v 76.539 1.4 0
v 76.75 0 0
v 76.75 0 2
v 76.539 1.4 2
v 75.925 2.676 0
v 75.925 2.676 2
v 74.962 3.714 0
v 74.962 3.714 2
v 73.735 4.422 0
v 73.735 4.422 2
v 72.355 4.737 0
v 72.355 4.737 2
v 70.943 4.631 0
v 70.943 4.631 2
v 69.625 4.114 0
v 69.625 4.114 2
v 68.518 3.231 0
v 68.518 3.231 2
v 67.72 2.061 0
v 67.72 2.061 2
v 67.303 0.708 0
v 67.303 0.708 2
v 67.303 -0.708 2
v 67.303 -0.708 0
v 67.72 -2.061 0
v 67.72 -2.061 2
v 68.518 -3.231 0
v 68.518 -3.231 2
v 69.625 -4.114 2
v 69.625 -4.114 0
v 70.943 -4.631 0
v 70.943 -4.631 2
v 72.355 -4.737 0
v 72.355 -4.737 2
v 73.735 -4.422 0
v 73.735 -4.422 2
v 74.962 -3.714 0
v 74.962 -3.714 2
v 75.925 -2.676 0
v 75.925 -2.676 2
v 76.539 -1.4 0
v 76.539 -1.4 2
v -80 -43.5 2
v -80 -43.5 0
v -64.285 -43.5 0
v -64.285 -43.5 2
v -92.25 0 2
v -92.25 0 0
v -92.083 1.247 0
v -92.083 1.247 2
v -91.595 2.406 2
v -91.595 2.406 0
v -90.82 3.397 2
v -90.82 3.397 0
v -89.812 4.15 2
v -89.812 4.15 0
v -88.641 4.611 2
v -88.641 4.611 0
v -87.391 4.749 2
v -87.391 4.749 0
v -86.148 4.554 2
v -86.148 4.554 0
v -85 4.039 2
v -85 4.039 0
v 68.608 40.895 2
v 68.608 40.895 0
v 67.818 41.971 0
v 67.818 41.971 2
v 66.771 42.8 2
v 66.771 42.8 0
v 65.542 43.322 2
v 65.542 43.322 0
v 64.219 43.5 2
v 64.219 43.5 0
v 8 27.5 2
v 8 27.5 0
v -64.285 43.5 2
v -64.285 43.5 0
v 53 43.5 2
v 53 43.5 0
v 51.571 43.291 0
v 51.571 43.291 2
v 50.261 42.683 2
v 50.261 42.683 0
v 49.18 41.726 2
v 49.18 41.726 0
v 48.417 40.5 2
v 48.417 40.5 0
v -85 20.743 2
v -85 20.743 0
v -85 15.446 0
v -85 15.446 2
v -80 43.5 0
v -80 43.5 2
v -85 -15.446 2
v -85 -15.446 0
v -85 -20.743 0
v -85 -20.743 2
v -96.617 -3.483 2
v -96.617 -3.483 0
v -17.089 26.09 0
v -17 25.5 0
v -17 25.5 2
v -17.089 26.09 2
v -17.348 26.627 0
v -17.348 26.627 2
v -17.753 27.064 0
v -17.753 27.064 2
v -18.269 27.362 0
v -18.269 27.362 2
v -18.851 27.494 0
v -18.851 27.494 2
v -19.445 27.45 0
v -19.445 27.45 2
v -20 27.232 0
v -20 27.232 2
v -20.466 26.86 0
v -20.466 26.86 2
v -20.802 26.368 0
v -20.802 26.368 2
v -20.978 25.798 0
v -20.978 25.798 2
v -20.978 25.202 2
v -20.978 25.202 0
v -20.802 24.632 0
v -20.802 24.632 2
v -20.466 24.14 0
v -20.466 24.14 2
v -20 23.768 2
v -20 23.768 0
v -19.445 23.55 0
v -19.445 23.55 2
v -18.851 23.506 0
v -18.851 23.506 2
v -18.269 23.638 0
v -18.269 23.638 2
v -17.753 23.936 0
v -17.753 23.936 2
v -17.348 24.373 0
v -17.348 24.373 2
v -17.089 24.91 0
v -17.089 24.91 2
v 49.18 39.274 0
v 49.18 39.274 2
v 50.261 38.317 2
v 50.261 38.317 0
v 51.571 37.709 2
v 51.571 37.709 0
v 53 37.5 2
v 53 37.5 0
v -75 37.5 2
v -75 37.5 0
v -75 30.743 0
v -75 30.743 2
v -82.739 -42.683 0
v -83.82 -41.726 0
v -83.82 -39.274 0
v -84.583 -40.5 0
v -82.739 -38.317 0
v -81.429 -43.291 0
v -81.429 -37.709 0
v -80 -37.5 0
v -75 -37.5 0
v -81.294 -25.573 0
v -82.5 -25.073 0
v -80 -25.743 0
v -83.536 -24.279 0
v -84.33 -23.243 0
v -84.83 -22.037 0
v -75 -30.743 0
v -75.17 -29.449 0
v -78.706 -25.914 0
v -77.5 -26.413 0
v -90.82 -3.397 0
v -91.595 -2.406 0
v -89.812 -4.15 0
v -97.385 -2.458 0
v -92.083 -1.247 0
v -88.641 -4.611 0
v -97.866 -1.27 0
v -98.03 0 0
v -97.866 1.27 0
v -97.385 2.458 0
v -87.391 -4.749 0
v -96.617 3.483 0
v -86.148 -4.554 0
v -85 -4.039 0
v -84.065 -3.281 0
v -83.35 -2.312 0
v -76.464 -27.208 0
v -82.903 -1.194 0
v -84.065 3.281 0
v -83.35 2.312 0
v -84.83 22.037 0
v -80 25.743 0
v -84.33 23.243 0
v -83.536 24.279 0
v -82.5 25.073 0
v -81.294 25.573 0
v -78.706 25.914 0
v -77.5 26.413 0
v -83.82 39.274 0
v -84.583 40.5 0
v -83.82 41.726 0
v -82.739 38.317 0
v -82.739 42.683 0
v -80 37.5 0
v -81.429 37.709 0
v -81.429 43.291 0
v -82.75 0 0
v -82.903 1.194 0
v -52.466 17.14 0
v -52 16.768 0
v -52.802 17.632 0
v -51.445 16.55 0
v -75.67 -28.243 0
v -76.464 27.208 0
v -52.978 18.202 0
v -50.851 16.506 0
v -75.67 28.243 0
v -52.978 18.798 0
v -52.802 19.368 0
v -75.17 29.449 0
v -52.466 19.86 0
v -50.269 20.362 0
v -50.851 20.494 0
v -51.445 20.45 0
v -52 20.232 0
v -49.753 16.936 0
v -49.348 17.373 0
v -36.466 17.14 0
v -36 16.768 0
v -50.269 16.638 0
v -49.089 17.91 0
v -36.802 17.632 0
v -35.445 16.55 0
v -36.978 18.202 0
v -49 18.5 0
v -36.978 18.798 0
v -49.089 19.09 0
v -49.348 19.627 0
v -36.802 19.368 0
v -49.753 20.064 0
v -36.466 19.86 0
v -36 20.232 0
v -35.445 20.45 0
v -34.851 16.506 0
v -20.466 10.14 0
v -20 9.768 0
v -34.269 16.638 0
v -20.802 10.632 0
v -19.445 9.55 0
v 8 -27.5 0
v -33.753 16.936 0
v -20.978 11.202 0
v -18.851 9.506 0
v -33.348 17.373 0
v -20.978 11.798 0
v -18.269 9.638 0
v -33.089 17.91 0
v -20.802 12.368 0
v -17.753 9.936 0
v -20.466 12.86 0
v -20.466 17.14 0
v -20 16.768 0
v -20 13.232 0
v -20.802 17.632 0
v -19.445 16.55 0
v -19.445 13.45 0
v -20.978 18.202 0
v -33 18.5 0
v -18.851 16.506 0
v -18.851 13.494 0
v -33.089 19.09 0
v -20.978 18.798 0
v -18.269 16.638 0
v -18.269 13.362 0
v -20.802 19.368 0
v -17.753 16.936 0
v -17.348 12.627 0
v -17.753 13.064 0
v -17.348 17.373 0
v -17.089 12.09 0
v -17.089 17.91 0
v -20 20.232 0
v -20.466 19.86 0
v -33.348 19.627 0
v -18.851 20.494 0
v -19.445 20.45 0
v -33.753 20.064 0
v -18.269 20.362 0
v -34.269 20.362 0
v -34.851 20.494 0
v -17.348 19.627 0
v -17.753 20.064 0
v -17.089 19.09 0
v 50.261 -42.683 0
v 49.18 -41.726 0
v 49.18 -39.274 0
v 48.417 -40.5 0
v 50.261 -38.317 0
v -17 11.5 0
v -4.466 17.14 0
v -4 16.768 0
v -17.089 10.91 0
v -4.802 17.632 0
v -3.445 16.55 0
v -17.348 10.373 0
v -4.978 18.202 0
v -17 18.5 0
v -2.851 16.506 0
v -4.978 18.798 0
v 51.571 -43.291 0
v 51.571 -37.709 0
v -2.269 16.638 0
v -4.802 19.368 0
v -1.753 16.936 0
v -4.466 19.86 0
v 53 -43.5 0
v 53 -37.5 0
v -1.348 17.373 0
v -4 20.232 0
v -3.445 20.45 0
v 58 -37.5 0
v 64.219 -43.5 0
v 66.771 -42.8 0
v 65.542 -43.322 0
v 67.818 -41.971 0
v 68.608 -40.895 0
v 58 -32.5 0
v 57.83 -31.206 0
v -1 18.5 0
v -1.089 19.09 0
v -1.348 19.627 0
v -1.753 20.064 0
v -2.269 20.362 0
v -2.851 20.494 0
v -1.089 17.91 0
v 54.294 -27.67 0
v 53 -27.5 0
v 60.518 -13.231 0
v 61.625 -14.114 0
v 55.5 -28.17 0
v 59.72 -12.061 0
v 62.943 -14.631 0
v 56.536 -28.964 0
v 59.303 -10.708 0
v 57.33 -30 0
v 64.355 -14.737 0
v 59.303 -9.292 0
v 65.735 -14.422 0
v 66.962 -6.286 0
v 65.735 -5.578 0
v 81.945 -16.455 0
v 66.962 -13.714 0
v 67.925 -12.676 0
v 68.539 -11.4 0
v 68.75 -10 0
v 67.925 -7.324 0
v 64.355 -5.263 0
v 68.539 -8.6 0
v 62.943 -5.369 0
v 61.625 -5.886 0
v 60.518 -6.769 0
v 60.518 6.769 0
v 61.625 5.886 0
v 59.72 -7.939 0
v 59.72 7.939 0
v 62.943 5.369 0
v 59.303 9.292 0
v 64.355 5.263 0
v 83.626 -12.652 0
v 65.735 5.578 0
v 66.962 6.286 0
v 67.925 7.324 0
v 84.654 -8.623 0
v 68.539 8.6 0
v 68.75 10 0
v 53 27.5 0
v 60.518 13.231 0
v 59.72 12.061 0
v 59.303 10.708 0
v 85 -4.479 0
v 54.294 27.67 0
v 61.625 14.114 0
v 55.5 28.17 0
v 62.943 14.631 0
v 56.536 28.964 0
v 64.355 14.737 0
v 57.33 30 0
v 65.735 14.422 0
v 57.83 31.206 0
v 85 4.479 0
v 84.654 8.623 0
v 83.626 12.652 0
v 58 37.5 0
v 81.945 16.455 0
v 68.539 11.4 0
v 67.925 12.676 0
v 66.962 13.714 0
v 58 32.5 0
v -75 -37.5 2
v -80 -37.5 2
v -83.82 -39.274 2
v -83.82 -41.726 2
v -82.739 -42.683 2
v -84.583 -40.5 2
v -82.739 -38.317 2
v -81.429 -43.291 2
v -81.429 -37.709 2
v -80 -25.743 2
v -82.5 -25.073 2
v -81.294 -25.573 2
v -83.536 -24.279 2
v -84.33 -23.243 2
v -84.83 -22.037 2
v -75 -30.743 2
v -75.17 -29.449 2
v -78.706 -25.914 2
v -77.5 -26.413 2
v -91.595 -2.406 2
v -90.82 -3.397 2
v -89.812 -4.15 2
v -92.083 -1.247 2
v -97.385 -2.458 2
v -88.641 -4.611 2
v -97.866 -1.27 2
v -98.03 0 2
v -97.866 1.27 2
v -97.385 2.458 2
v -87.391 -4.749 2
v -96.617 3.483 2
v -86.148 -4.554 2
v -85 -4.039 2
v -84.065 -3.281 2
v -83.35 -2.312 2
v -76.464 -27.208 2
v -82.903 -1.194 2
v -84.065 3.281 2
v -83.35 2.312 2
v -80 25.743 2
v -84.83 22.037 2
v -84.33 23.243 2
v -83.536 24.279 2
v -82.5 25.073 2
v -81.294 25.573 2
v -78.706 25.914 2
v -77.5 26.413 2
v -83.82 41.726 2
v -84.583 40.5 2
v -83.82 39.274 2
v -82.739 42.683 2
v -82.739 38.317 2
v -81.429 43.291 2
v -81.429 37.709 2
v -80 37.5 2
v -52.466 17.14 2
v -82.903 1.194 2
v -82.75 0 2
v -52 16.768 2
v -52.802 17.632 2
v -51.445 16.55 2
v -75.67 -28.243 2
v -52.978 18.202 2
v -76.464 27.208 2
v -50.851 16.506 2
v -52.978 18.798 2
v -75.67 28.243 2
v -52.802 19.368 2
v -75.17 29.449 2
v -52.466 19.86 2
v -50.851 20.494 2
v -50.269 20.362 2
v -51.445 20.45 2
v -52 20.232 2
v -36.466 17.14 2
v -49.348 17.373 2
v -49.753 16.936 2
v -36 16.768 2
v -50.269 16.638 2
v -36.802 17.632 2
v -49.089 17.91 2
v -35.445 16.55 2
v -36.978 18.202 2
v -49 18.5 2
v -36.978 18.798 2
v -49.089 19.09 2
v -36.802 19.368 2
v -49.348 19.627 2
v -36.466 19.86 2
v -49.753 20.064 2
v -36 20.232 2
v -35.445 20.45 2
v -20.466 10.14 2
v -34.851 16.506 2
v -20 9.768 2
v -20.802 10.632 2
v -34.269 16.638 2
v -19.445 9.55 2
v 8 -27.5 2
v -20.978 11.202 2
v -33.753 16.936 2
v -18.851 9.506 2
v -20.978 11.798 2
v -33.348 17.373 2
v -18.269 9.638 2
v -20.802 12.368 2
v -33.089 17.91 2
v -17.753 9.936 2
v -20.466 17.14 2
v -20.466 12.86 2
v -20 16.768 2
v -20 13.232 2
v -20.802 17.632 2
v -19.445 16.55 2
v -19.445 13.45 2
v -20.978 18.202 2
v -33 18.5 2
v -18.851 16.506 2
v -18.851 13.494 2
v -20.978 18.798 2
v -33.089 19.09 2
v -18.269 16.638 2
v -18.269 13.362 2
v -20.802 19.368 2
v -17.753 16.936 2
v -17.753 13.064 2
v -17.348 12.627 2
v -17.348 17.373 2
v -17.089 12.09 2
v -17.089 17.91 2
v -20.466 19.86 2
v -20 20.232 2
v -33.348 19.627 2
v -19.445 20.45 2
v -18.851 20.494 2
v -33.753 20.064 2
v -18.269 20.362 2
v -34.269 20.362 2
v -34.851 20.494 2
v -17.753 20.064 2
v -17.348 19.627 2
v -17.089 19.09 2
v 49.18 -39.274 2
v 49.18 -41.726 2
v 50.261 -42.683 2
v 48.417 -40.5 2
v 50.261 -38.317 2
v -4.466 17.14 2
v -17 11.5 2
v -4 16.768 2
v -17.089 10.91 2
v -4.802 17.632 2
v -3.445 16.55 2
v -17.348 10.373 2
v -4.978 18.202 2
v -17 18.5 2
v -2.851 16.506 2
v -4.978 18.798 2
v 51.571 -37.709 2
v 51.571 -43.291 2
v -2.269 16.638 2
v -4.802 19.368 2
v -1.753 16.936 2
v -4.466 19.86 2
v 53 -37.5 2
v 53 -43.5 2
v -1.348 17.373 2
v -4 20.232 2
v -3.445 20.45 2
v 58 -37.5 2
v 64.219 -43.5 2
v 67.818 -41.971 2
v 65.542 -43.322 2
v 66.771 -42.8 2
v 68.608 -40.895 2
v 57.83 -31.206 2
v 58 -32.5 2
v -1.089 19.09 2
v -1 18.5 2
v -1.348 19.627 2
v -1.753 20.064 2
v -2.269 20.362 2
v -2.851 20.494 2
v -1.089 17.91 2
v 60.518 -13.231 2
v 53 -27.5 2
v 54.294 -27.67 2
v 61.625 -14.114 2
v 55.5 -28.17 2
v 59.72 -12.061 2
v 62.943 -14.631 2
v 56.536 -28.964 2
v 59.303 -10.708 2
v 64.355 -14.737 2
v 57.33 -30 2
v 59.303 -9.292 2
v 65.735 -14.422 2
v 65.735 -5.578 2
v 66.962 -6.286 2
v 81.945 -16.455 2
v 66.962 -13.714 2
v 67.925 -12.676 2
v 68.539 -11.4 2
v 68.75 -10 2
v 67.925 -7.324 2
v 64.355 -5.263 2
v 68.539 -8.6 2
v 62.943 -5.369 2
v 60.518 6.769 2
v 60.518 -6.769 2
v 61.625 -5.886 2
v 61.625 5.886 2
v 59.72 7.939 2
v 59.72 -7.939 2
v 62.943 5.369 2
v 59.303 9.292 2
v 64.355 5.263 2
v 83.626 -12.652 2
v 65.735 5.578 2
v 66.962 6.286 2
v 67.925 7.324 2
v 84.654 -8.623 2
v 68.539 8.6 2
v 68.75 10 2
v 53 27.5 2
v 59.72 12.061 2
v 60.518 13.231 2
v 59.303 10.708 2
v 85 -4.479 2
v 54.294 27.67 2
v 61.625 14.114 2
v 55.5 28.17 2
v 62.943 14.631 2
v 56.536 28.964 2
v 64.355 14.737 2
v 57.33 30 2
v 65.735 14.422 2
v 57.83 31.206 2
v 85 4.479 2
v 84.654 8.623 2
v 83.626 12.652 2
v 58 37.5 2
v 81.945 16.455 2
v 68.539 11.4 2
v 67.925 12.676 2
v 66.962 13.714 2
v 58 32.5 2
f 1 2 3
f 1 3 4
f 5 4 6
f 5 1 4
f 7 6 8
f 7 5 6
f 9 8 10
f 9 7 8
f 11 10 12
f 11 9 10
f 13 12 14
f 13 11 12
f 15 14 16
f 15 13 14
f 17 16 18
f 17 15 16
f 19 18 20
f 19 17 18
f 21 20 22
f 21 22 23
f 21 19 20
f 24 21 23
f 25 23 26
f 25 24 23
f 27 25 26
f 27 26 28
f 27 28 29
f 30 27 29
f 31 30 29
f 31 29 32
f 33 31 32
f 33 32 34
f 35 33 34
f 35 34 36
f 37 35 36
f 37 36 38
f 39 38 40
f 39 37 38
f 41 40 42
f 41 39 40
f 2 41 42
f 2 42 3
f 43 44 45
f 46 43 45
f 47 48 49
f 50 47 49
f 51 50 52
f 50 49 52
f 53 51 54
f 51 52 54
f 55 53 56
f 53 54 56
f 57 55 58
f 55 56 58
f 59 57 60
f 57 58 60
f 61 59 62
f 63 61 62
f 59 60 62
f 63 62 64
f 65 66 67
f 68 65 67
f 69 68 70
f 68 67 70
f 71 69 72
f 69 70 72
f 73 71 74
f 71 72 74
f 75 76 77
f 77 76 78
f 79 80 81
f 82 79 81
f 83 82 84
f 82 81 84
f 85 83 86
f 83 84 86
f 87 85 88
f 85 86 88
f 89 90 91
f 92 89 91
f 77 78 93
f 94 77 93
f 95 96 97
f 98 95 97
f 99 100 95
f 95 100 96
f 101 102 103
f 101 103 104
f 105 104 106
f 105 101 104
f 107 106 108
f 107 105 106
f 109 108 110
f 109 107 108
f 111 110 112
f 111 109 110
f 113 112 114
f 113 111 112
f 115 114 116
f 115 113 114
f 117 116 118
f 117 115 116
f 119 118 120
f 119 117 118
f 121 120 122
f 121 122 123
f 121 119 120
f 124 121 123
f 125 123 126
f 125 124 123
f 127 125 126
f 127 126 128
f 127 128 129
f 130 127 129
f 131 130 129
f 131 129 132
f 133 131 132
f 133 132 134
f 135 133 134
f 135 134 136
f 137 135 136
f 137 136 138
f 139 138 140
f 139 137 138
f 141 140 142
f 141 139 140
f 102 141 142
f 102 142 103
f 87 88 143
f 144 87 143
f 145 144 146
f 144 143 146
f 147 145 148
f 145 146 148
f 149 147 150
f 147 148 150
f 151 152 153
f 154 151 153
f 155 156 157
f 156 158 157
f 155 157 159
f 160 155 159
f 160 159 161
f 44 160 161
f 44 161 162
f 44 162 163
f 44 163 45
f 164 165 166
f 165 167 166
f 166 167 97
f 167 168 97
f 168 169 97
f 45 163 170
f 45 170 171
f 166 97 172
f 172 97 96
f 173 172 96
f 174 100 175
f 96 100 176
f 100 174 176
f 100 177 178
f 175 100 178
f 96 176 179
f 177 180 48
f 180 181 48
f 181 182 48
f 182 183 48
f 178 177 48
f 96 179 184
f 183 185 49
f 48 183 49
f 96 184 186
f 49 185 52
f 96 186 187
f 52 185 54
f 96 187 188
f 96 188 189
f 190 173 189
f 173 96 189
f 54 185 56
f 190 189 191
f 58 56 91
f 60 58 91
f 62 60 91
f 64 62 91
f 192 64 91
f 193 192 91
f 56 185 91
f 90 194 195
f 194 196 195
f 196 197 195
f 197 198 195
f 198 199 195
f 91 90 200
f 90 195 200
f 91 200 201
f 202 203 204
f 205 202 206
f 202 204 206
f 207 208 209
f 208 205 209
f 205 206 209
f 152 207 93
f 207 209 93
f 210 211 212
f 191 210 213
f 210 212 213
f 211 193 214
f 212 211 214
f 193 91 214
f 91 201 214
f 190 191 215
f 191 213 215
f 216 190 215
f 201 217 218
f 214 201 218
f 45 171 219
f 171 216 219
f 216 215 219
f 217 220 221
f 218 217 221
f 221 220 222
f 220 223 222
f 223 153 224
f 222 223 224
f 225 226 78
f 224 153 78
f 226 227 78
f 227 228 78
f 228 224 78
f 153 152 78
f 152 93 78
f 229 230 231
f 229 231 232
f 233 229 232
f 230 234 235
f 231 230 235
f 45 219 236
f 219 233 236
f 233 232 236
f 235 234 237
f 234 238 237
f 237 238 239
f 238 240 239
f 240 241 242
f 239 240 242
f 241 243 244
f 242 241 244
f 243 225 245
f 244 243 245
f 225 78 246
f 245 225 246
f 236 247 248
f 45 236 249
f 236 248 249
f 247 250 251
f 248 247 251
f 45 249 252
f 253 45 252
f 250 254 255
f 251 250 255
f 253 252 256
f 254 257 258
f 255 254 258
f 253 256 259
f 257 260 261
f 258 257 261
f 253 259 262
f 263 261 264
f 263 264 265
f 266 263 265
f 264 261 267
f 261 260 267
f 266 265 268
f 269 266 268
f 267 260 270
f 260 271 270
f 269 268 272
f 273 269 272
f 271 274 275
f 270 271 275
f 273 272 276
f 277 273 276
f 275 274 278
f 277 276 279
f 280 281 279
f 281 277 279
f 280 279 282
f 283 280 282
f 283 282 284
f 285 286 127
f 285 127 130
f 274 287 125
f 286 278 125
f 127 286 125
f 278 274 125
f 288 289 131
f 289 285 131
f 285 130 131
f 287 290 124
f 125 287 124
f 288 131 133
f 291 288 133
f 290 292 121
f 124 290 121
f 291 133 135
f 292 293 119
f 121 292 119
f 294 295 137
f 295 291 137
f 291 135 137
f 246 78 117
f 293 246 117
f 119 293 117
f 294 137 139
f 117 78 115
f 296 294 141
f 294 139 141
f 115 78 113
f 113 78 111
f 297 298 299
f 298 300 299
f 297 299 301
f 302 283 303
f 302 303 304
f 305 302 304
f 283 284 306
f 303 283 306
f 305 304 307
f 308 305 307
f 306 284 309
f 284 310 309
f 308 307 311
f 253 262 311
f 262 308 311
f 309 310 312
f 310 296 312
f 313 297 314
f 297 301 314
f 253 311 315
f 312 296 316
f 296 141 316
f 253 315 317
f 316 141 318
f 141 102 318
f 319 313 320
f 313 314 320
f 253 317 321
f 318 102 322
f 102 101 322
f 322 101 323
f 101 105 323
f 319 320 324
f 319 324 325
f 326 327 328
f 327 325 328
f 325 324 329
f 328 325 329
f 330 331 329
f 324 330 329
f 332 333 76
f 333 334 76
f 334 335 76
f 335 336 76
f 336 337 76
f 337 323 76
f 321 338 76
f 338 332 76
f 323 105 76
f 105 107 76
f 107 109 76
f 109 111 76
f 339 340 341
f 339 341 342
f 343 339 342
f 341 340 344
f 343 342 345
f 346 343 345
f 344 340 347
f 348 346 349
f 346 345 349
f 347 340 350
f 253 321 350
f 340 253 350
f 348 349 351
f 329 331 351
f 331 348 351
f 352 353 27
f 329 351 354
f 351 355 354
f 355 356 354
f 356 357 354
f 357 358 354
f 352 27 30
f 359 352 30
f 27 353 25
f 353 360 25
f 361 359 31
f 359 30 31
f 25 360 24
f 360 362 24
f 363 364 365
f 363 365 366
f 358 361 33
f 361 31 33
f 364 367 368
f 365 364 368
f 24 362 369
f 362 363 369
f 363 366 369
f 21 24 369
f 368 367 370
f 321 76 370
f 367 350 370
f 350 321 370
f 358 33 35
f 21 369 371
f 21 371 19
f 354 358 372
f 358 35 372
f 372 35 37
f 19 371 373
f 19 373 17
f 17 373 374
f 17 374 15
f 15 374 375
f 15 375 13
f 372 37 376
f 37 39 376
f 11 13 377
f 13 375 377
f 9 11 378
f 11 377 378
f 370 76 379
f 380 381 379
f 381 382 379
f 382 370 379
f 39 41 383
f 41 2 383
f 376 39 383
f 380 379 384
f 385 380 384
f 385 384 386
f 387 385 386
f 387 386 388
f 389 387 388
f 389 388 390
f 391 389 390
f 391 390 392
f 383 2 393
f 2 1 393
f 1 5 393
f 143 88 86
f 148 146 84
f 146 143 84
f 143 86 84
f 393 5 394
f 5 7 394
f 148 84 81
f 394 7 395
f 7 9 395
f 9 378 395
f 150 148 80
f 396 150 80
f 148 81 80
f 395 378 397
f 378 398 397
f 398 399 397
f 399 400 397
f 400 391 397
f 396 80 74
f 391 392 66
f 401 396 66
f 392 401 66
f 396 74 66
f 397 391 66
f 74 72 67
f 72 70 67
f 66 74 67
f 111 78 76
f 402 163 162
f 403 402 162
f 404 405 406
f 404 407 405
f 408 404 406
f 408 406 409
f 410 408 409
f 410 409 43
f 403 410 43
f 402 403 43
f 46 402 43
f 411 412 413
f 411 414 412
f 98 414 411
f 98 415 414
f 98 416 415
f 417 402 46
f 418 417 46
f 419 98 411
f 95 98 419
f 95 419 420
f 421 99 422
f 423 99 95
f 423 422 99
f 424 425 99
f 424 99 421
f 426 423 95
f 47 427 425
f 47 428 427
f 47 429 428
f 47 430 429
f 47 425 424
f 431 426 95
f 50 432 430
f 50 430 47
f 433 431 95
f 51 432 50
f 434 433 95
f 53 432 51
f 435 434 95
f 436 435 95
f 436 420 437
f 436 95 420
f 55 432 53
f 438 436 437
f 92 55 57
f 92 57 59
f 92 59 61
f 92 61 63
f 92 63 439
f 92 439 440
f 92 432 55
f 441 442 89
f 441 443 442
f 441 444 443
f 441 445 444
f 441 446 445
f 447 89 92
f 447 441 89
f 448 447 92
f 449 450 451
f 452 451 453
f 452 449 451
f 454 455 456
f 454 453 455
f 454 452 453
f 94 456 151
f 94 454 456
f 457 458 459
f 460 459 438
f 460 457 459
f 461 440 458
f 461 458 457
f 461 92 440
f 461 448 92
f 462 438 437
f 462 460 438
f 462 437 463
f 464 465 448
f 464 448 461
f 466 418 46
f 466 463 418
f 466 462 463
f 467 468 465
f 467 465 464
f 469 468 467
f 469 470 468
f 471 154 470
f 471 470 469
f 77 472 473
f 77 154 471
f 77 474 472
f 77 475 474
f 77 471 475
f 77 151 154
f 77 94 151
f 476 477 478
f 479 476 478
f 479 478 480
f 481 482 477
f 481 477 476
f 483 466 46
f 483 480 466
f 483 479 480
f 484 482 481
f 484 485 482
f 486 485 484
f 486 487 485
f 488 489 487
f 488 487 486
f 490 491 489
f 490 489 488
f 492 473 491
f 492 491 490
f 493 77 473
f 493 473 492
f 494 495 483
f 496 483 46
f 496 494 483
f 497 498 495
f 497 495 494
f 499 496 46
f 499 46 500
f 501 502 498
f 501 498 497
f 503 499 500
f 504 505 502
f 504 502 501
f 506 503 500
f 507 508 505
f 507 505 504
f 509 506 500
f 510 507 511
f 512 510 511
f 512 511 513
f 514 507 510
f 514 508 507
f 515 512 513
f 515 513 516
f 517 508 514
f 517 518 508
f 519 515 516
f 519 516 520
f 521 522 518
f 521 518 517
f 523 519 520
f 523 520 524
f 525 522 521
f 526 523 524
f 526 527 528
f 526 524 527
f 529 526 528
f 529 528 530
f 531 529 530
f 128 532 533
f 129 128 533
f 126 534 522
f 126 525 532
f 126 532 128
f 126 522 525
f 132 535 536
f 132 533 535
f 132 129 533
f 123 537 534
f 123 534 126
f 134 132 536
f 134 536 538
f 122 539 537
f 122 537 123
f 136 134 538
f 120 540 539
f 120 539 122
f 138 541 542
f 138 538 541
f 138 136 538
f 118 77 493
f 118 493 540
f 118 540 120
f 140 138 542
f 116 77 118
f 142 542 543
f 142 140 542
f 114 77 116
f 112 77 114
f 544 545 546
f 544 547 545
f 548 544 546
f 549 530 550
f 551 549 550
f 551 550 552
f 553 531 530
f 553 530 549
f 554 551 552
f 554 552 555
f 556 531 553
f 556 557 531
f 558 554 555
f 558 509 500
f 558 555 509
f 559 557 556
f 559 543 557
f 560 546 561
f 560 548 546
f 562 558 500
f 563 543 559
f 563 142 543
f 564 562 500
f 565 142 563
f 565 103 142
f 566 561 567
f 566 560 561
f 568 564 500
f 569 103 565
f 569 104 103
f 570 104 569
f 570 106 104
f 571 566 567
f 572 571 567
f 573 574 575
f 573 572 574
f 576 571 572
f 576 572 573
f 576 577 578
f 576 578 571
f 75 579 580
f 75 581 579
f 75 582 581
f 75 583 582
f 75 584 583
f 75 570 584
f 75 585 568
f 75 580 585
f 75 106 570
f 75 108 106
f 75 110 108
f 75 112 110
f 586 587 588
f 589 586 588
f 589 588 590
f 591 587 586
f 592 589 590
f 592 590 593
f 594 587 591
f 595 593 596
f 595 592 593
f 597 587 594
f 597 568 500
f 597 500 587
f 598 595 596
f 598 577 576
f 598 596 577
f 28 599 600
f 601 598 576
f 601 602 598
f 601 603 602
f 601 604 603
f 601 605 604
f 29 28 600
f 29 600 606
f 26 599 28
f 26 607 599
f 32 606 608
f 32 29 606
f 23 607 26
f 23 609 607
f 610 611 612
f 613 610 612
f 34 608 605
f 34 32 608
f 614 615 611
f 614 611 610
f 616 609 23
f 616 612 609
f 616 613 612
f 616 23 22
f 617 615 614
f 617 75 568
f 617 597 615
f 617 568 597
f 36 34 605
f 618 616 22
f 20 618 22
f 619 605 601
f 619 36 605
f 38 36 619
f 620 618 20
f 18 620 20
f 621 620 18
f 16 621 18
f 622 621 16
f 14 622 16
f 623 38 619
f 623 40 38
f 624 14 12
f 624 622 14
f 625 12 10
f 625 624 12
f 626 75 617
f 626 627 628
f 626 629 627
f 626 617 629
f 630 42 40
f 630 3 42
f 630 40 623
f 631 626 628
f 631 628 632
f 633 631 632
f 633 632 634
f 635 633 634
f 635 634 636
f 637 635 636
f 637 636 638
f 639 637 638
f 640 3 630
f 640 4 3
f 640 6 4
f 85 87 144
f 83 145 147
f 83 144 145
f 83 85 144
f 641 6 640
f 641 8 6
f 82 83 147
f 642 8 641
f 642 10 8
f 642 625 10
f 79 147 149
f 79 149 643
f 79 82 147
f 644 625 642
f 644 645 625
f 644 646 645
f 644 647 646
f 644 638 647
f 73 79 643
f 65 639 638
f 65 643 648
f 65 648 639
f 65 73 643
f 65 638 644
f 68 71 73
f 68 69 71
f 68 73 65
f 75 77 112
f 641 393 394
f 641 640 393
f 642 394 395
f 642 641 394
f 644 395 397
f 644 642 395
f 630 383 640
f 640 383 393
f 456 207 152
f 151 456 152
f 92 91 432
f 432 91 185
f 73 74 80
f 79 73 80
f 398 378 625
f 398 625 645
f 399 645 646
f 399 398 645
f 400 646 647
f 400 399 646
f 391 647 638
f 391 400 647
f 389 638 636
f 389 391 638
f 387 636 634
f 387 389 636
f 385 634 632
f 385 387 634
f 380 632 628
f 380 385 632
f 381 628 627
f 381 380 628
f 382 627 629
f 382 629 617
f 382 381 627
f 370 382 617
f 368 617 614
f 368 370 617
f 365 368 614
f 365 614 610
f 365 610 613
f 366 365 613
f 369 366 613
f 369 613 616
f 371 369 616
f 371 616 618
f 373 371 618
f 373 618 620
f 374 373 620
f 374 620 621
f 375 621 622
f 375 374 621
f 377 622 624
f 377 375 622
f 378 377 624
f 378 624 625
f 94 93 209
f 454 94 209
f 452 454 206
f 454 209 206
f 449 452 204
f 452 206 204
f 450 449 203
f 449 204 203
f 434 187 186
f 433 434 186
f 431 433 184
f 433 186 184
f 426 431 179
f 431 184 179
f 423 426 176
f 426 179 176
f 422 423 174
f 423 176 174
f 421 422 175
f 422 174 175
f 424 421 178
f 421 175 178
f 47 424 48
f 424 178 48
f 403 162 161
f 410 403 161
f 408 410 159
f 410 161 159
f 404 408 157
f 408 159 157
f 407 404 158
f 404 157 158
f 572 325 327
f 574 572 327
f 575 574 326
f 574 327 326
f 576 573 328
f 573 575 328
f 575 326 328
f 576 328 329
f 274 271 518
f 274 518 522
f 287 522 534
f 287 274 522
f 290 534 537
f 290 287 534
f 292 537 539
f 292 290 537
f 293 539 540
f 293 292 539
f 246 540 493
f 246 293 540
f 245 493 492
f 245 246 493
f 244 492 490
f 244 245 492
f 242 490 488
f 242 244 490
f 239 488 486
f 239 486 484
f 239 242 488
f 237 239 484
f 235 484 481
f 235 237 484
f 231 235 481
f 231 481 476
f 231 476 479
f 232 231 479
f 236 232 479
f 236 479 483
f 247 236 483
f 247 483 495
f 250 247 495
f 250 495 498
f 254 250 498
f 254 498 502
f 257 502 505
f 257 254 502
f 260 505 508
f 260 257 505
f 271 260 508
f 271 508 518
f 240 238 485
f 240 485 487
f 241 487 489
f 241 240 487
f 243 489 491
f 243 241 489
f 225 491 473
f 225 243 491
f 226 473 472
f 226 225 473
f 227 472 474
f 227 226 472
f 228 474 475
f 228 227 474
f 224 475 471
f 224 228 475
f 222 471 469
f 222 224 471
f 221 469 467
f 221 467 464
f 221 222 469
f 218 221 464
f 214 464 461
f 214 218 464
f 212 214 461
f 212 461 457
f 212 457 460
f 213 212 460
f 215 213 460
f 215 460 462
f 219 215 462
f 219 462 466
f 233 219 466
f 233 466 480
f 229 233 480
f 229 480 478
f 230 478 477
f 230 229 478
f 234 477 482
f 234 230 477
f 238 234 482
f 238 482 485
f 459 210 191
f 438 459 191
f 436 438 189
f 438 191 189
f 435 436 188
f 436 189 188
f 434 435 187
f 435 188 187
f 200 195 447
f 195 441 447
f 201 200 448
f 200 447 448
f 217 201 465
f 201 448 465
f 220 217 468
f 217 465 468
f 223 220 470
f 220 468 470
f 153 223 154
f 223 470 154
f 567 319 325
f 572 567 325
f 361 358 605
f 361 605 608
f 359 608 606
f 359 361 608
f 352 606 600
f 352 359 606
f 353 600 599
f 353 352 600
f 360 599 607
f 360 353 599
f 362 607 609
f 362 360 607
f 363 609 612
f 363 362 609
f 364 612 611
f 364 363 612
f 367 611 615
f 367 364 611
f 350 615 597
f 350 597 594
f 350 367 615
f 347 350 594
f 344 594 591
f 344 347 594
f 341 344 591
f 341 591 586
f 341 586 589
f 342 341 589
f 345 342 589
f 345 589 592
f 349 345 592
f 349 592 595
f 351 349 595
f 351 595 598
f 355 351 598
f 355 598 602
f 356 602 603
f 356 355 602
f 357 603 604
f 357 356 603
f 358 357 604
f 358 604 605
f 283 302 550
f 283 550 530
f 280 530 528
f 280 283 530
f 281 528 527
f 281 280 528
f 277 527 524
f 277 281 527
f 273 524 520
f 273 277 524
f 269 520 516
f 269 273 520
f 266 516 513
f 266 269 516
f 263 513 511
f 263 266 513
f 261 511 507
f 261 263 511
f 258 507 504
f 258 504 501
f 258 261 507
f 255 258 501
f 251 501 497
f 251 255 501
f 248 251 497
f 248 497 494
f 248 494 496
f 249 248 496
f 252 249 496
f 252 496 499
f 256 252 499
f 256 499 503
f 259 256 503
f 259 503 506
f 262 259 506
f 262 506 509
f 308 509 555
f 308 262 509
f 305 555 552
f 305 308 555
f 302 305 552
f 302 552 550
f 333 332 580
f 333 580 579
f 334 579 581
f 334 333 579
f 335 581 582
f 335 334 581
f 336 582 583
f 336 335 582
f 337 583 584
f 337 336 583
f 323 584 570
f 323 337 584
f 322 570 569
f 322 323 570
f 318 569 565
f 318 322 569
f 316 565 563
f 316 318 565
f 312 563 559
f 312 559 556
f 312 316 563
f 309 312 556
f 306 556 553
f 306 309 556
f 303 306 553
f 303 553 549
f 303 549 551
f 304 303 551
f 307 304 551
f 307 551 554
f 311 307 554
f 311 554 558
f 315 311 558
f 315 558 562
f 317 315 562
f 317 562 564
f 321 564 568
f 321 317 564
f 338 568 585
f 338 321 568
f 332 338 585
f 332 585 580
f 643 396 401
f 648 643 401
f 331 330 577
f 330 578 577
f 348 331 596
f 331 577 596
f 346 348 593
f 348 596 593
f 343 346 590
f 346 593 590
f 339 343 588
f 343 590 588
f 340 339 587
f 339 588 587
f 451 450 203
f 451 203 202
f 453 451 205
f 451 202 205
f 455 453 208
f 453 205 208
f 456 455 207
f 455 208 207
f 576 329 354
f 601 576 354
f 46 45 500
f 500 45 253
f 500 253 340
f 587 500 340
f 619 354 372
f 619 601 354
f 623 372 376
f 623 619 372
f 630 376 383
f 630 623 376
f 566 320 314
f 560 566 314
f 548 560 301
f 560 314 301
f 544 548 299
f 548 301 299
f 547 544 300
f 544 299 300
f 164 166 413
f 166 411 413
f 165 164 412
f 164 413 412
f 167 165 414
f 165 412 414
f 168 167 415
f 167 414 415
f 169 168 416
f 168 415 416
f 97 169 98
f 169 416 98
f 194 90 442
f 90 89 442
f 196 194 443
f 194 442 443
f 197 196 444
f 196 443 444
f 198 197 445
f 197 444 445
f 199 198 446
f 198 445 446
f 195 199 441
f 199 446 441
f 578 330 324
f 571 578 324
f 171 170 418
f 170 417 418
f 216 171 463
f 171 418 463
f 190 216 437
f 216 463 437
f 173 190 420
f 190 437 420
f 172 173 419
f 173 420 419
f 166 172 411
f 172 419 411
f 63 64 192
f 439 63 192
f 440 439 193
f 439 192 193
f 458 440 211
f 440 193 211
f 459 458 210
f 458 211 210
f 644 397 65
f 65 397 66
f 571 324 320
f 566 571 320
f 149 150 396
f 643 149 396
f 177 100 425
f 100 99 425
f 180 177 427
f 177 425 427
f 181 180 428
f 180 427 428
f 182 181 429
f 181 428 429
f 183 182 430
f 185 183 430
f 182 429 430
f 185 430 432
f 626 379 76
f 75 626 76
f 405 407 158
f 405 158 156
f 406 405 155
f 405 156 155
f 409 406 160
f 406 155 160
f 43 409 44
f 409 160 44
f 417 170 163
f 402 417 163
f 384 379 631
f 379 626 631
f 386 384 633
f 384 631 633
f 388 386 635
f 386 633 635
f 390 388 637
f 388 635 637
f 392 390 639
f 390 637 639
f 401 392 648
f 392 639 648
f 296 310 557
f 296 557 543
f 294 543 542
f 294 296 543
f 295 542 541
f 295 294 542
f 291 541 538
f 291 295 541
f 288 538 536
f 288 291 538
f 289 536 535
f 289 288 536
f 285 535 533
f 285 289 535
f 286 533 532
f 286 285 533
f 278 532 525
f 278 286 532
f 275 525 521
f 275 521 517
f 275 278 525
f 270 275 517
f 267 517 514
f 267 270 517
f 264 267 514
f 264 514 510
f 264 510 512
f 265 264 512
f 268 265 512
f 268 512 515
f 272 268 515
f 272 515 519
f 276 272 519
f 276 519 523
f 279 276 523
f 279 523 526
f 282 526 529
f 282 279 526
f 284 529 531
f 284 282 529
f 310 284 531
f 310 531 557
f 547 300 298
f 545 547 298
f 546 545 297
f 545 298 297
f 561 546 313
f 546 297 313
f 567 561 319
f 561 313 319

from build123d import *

# Parameters (mm, degrees)
F0_R        = 4.75
F0_R_2      = 2
F1_DEPTH    = 2
F2_T1_DEPTH = 16.8375789978
F2_T3_DEPTH = 27
F3_R        = 5
F4_R        = 4.99999
F5_R        = 25


# Not quite as in the source:
# - a fillet or chamfer that OpenCascade refuses, or shapes differently, is made with other operations: its cross-section is extruded or revolved along the edge and cut away or added
# - a fillet or chamfer is up to 0.001 mm smaller than in the source, because OpenCascade refuses the exact size


with BuildPart() as f1:
    # F0 (on Top) → F1 (new body)
    with BuildSketch(Plane.XY):
        Polygon((48, -43.5), (67.1863725781, -43.5), (85, -10.8566070522), (85, 10.8566070522), (67.1863725781, 43.5), (48, 43.5), (48, 37.5), (58, 37.5), (58, 27.5), (8, 27.5), (-64.2852836847, 43.5), (-85, 43.5), (-85, 37.5), (-75, 37.5), (-75, 25.7433671504), (-75, 0), (-75, -25.7433671504), (-75, -37.5), (-85, -37.5), (-85, -43.5), (-64.2852836847, -43.5), (8, -27.5), (58, -27.5), (58, -37.5), (48, -37.5), align=None)
        with Locations((64, -10)):
            Circle(F0_R, mode=Mode.SUBTRACT)
        with Locations((-51, 18.5)):
            Circle(F0_R_2, mode=Mode.SUBTRACT)
        with Locations((-35, 18.5)):
            Circle(F0_R_2, mode=Mode.SUBTRACT)
        with Locations((-19, 11.5)):
            Circle(F0_R_2, mode=Mode.SUBTRACT)
        with Locations((-19, 18.5)):
            Circle(F0_R_2, mode=Mode.SUBTRACT)
        with Locations((-19, 25.5)):
            Circle(F0_R_2, mode=Mode.SUBTRACT)
        with Locations((-3, 18.5)):
            Circle(F0_R_2, mode=Mode.SUBTRACT)
        with Locations((72, 0)):
            Circle(F0_R, mode=Mode.SUBTRACT)
        with Locations((64, 10)):
            Circle(F0_R, mode=Mode.SUBTRACT)
        with BuildLine():
            Line((-82.75, 0), (-75, 0))
            Line((-75, 0), (-75, 25.7433671504))
            Line((-75, 25.7433671504), (-85, 15.4460202903))
            Line((-85, 15.4460202903), (-85, 4.0388736054))
            ThreePointArc((-85, 4.0388736054), (-83.3504518318, 2.3116552511), (-82.75, 0))
        make_face()
        with BuildLine():
            Line((-85, 15.4460202903), (-100, 0))
            Line((-100, 0), (-92.25, 0))
            ThreePointArc((-92.25, 0), (-89.8116552511, 4.1495481682), (-85, 4.0388736054))
            Line((-85, 4.0388736054), (-85, 15.4460202903))
        make_face()
        with BuildLine():
            Line((-85, -4.0388736054), (-85, -15.4460202903))
            Line((-85, -15.4460202903), (-75, -25.7433671504))
            Line((-75, -25.7433671504), (-75, 0))
            Line((-75, 0), (-82.75, 0))
            ThreePointArc((-82.75, 0), (-83.3504518318, -2.3116552511), (-85, -4.0388736054))
        make_face()
        with BuildLine():
            Line((-100, 0), (-85, -15.4460202903))
            Line((-85, -15.4460202903), (-85, -4.0388736054))
            ThreePointArc((-85, -4.0388736054), (-89.8116552511, -4.1495481682), (-92.25, 0))
            Line((-92.25, 0), (-100, 0))
        make_face()
        Polygon((-75, 25.7433671504), (-85, 25.7433671504), (-85, 15.4460202903), align=None)
        Polygon((-85, -15.4460202903), (-85, -25.7433671504), (-75, -25.7433671504), align=None)
    extrude(amount=F1_DEPTH)

    # F2: fillet of radius 5 on 10 edges, made by hand

    # F2_s2 → F2_t1 (cut)
    with BuildSketch(Plane.XY.offset(-7.4187894989)):
        with BuildLine():
            ThreePointArc((68.607874454, 40.8951041407), (66.7707657989, 42.7997395679), (64.2188567786, 43.5))
            Line((64.2188567786, 43.5), (67.1863725781, 43.5))
            Line((67.1863725781, 43.5), (68.607874454, 40.8951041407))
        make_face()
        with BuildLine():
            ThreePointArc((64.2188567786, -43.5), (66.7707657989, -42.7997395679), (68.607874454, -40.8951041407))
            Line((68.607874454, -40.8951041407), (67.1863725781, -43.5))
            Line((67.1863725781, -43.5), (64.2188567786, -43.5))
        make_face()
    extrude(amount=F2_T1_DEPTH, mode=Mode.SUBTRACT)

    # F2_s4 → F2_t3 (cut)
    with BuildSketch(Plane.XY.offset(-12.5)):
        with BuildLine():
            ThreePointArc((53, 43.5), (49.4644660941, 42.0355339059), (48, 38.5))
            Line((48, 38.5), (48, 43.5))
            Line((48, 43.5), (53, 43.5))
        make_face()
        with BuildLine():
            ThreePointArc((-85, -38.5), (-83.5355339059, -42.0355339059), (-80, -43.5))
            Line((-80, -43.5), (-85, -43.5))
            Line((-85, -43.5), (-85, -38.5))
        make_face()
        with BuildLine():
            ThreePointArc((-80, -37.5), (-83.5355339059, -38.9644660941), (-85, -42.5))
            Line((-85, -42.5), (-85, -37.5))
            Line((-85, -37.5), (-80, -37.5))
        make_face()
        with BuildLine():
            ThreePointArc((48, -38.5), (49.4644660941, -42.0355339059), (53, -43.5))
            Line((53, -43.5), (48, -43.5))
            Line((48, -43.5), (48, -38.5))
        make_face()
        with BuildLine():
            ThreePointArc((53, -37.5), (49.4644660941, -38.9644660941), (48, -42.5))
            Line((48, -42.5), (48, -37.5))
            Line((48, -37.5), (53, -37.5))
        make_face()
        with BuildLine():
            ThreePointArc((48, 42.5), (49.4644660941, 38.9644660941), (53, 37.5))
            Line((53, 37.5), (48, 37.5))
            Line((48, 37.5), (48, 42.5))
        make_face()
        with BuildLine():
            ThreePointArc((-85, 42.5), (-83.5355339059, 38.9644660941), (-80, 37.5))
            Line((-80, 37.5), (-85, 37.5))
            Line((-85, 37.5), (-85, 42.5))
        make_face()
        with BuildLine():
            ThreePointArc((-80, 43.5), (-83.5355339059, 42.0355339059), (-85, 38.5))
            Line((-85, 38.5), (-85, 43.5))
            Line((-85, 43.5), (-80, 43.5))
        make_face()
    extrude(amount=F2_T3_DEPTH, mode=Mode.SUBTRACT)

    # F3
    f3_edges = [f1.edges().sort_by_distance(p)[0] for p in [
        (58, -27.5, 1),
        (58, 27.5, 1),
    ]]
    fillet(f3_edges, radius=F3_R)

    # F4 (radius 5 in the source; OpenCascade refuses exactly that, so slightly less here)
    f4_edges = [f1.edges().sort_by_distance(p)[0] for p in [
        (-85, 25.743367, 1),
        (-85, -25.743367, 1),
        (-75, 25.743367, 1),
        (-75, -25.743367, 1),
        (-100, 0, 1),
    ]]
    fillet(f4_edges, radius=F4_R)

    # F5
    f5_edges = [f1.edges().sort_by_distance(p)[0] for p in [
        (85, -10.856607, 1),
        (85, 10.856607, 1),
    ]]
    fillet(f5_edges, radius=F5_R)


solid = f1.part
